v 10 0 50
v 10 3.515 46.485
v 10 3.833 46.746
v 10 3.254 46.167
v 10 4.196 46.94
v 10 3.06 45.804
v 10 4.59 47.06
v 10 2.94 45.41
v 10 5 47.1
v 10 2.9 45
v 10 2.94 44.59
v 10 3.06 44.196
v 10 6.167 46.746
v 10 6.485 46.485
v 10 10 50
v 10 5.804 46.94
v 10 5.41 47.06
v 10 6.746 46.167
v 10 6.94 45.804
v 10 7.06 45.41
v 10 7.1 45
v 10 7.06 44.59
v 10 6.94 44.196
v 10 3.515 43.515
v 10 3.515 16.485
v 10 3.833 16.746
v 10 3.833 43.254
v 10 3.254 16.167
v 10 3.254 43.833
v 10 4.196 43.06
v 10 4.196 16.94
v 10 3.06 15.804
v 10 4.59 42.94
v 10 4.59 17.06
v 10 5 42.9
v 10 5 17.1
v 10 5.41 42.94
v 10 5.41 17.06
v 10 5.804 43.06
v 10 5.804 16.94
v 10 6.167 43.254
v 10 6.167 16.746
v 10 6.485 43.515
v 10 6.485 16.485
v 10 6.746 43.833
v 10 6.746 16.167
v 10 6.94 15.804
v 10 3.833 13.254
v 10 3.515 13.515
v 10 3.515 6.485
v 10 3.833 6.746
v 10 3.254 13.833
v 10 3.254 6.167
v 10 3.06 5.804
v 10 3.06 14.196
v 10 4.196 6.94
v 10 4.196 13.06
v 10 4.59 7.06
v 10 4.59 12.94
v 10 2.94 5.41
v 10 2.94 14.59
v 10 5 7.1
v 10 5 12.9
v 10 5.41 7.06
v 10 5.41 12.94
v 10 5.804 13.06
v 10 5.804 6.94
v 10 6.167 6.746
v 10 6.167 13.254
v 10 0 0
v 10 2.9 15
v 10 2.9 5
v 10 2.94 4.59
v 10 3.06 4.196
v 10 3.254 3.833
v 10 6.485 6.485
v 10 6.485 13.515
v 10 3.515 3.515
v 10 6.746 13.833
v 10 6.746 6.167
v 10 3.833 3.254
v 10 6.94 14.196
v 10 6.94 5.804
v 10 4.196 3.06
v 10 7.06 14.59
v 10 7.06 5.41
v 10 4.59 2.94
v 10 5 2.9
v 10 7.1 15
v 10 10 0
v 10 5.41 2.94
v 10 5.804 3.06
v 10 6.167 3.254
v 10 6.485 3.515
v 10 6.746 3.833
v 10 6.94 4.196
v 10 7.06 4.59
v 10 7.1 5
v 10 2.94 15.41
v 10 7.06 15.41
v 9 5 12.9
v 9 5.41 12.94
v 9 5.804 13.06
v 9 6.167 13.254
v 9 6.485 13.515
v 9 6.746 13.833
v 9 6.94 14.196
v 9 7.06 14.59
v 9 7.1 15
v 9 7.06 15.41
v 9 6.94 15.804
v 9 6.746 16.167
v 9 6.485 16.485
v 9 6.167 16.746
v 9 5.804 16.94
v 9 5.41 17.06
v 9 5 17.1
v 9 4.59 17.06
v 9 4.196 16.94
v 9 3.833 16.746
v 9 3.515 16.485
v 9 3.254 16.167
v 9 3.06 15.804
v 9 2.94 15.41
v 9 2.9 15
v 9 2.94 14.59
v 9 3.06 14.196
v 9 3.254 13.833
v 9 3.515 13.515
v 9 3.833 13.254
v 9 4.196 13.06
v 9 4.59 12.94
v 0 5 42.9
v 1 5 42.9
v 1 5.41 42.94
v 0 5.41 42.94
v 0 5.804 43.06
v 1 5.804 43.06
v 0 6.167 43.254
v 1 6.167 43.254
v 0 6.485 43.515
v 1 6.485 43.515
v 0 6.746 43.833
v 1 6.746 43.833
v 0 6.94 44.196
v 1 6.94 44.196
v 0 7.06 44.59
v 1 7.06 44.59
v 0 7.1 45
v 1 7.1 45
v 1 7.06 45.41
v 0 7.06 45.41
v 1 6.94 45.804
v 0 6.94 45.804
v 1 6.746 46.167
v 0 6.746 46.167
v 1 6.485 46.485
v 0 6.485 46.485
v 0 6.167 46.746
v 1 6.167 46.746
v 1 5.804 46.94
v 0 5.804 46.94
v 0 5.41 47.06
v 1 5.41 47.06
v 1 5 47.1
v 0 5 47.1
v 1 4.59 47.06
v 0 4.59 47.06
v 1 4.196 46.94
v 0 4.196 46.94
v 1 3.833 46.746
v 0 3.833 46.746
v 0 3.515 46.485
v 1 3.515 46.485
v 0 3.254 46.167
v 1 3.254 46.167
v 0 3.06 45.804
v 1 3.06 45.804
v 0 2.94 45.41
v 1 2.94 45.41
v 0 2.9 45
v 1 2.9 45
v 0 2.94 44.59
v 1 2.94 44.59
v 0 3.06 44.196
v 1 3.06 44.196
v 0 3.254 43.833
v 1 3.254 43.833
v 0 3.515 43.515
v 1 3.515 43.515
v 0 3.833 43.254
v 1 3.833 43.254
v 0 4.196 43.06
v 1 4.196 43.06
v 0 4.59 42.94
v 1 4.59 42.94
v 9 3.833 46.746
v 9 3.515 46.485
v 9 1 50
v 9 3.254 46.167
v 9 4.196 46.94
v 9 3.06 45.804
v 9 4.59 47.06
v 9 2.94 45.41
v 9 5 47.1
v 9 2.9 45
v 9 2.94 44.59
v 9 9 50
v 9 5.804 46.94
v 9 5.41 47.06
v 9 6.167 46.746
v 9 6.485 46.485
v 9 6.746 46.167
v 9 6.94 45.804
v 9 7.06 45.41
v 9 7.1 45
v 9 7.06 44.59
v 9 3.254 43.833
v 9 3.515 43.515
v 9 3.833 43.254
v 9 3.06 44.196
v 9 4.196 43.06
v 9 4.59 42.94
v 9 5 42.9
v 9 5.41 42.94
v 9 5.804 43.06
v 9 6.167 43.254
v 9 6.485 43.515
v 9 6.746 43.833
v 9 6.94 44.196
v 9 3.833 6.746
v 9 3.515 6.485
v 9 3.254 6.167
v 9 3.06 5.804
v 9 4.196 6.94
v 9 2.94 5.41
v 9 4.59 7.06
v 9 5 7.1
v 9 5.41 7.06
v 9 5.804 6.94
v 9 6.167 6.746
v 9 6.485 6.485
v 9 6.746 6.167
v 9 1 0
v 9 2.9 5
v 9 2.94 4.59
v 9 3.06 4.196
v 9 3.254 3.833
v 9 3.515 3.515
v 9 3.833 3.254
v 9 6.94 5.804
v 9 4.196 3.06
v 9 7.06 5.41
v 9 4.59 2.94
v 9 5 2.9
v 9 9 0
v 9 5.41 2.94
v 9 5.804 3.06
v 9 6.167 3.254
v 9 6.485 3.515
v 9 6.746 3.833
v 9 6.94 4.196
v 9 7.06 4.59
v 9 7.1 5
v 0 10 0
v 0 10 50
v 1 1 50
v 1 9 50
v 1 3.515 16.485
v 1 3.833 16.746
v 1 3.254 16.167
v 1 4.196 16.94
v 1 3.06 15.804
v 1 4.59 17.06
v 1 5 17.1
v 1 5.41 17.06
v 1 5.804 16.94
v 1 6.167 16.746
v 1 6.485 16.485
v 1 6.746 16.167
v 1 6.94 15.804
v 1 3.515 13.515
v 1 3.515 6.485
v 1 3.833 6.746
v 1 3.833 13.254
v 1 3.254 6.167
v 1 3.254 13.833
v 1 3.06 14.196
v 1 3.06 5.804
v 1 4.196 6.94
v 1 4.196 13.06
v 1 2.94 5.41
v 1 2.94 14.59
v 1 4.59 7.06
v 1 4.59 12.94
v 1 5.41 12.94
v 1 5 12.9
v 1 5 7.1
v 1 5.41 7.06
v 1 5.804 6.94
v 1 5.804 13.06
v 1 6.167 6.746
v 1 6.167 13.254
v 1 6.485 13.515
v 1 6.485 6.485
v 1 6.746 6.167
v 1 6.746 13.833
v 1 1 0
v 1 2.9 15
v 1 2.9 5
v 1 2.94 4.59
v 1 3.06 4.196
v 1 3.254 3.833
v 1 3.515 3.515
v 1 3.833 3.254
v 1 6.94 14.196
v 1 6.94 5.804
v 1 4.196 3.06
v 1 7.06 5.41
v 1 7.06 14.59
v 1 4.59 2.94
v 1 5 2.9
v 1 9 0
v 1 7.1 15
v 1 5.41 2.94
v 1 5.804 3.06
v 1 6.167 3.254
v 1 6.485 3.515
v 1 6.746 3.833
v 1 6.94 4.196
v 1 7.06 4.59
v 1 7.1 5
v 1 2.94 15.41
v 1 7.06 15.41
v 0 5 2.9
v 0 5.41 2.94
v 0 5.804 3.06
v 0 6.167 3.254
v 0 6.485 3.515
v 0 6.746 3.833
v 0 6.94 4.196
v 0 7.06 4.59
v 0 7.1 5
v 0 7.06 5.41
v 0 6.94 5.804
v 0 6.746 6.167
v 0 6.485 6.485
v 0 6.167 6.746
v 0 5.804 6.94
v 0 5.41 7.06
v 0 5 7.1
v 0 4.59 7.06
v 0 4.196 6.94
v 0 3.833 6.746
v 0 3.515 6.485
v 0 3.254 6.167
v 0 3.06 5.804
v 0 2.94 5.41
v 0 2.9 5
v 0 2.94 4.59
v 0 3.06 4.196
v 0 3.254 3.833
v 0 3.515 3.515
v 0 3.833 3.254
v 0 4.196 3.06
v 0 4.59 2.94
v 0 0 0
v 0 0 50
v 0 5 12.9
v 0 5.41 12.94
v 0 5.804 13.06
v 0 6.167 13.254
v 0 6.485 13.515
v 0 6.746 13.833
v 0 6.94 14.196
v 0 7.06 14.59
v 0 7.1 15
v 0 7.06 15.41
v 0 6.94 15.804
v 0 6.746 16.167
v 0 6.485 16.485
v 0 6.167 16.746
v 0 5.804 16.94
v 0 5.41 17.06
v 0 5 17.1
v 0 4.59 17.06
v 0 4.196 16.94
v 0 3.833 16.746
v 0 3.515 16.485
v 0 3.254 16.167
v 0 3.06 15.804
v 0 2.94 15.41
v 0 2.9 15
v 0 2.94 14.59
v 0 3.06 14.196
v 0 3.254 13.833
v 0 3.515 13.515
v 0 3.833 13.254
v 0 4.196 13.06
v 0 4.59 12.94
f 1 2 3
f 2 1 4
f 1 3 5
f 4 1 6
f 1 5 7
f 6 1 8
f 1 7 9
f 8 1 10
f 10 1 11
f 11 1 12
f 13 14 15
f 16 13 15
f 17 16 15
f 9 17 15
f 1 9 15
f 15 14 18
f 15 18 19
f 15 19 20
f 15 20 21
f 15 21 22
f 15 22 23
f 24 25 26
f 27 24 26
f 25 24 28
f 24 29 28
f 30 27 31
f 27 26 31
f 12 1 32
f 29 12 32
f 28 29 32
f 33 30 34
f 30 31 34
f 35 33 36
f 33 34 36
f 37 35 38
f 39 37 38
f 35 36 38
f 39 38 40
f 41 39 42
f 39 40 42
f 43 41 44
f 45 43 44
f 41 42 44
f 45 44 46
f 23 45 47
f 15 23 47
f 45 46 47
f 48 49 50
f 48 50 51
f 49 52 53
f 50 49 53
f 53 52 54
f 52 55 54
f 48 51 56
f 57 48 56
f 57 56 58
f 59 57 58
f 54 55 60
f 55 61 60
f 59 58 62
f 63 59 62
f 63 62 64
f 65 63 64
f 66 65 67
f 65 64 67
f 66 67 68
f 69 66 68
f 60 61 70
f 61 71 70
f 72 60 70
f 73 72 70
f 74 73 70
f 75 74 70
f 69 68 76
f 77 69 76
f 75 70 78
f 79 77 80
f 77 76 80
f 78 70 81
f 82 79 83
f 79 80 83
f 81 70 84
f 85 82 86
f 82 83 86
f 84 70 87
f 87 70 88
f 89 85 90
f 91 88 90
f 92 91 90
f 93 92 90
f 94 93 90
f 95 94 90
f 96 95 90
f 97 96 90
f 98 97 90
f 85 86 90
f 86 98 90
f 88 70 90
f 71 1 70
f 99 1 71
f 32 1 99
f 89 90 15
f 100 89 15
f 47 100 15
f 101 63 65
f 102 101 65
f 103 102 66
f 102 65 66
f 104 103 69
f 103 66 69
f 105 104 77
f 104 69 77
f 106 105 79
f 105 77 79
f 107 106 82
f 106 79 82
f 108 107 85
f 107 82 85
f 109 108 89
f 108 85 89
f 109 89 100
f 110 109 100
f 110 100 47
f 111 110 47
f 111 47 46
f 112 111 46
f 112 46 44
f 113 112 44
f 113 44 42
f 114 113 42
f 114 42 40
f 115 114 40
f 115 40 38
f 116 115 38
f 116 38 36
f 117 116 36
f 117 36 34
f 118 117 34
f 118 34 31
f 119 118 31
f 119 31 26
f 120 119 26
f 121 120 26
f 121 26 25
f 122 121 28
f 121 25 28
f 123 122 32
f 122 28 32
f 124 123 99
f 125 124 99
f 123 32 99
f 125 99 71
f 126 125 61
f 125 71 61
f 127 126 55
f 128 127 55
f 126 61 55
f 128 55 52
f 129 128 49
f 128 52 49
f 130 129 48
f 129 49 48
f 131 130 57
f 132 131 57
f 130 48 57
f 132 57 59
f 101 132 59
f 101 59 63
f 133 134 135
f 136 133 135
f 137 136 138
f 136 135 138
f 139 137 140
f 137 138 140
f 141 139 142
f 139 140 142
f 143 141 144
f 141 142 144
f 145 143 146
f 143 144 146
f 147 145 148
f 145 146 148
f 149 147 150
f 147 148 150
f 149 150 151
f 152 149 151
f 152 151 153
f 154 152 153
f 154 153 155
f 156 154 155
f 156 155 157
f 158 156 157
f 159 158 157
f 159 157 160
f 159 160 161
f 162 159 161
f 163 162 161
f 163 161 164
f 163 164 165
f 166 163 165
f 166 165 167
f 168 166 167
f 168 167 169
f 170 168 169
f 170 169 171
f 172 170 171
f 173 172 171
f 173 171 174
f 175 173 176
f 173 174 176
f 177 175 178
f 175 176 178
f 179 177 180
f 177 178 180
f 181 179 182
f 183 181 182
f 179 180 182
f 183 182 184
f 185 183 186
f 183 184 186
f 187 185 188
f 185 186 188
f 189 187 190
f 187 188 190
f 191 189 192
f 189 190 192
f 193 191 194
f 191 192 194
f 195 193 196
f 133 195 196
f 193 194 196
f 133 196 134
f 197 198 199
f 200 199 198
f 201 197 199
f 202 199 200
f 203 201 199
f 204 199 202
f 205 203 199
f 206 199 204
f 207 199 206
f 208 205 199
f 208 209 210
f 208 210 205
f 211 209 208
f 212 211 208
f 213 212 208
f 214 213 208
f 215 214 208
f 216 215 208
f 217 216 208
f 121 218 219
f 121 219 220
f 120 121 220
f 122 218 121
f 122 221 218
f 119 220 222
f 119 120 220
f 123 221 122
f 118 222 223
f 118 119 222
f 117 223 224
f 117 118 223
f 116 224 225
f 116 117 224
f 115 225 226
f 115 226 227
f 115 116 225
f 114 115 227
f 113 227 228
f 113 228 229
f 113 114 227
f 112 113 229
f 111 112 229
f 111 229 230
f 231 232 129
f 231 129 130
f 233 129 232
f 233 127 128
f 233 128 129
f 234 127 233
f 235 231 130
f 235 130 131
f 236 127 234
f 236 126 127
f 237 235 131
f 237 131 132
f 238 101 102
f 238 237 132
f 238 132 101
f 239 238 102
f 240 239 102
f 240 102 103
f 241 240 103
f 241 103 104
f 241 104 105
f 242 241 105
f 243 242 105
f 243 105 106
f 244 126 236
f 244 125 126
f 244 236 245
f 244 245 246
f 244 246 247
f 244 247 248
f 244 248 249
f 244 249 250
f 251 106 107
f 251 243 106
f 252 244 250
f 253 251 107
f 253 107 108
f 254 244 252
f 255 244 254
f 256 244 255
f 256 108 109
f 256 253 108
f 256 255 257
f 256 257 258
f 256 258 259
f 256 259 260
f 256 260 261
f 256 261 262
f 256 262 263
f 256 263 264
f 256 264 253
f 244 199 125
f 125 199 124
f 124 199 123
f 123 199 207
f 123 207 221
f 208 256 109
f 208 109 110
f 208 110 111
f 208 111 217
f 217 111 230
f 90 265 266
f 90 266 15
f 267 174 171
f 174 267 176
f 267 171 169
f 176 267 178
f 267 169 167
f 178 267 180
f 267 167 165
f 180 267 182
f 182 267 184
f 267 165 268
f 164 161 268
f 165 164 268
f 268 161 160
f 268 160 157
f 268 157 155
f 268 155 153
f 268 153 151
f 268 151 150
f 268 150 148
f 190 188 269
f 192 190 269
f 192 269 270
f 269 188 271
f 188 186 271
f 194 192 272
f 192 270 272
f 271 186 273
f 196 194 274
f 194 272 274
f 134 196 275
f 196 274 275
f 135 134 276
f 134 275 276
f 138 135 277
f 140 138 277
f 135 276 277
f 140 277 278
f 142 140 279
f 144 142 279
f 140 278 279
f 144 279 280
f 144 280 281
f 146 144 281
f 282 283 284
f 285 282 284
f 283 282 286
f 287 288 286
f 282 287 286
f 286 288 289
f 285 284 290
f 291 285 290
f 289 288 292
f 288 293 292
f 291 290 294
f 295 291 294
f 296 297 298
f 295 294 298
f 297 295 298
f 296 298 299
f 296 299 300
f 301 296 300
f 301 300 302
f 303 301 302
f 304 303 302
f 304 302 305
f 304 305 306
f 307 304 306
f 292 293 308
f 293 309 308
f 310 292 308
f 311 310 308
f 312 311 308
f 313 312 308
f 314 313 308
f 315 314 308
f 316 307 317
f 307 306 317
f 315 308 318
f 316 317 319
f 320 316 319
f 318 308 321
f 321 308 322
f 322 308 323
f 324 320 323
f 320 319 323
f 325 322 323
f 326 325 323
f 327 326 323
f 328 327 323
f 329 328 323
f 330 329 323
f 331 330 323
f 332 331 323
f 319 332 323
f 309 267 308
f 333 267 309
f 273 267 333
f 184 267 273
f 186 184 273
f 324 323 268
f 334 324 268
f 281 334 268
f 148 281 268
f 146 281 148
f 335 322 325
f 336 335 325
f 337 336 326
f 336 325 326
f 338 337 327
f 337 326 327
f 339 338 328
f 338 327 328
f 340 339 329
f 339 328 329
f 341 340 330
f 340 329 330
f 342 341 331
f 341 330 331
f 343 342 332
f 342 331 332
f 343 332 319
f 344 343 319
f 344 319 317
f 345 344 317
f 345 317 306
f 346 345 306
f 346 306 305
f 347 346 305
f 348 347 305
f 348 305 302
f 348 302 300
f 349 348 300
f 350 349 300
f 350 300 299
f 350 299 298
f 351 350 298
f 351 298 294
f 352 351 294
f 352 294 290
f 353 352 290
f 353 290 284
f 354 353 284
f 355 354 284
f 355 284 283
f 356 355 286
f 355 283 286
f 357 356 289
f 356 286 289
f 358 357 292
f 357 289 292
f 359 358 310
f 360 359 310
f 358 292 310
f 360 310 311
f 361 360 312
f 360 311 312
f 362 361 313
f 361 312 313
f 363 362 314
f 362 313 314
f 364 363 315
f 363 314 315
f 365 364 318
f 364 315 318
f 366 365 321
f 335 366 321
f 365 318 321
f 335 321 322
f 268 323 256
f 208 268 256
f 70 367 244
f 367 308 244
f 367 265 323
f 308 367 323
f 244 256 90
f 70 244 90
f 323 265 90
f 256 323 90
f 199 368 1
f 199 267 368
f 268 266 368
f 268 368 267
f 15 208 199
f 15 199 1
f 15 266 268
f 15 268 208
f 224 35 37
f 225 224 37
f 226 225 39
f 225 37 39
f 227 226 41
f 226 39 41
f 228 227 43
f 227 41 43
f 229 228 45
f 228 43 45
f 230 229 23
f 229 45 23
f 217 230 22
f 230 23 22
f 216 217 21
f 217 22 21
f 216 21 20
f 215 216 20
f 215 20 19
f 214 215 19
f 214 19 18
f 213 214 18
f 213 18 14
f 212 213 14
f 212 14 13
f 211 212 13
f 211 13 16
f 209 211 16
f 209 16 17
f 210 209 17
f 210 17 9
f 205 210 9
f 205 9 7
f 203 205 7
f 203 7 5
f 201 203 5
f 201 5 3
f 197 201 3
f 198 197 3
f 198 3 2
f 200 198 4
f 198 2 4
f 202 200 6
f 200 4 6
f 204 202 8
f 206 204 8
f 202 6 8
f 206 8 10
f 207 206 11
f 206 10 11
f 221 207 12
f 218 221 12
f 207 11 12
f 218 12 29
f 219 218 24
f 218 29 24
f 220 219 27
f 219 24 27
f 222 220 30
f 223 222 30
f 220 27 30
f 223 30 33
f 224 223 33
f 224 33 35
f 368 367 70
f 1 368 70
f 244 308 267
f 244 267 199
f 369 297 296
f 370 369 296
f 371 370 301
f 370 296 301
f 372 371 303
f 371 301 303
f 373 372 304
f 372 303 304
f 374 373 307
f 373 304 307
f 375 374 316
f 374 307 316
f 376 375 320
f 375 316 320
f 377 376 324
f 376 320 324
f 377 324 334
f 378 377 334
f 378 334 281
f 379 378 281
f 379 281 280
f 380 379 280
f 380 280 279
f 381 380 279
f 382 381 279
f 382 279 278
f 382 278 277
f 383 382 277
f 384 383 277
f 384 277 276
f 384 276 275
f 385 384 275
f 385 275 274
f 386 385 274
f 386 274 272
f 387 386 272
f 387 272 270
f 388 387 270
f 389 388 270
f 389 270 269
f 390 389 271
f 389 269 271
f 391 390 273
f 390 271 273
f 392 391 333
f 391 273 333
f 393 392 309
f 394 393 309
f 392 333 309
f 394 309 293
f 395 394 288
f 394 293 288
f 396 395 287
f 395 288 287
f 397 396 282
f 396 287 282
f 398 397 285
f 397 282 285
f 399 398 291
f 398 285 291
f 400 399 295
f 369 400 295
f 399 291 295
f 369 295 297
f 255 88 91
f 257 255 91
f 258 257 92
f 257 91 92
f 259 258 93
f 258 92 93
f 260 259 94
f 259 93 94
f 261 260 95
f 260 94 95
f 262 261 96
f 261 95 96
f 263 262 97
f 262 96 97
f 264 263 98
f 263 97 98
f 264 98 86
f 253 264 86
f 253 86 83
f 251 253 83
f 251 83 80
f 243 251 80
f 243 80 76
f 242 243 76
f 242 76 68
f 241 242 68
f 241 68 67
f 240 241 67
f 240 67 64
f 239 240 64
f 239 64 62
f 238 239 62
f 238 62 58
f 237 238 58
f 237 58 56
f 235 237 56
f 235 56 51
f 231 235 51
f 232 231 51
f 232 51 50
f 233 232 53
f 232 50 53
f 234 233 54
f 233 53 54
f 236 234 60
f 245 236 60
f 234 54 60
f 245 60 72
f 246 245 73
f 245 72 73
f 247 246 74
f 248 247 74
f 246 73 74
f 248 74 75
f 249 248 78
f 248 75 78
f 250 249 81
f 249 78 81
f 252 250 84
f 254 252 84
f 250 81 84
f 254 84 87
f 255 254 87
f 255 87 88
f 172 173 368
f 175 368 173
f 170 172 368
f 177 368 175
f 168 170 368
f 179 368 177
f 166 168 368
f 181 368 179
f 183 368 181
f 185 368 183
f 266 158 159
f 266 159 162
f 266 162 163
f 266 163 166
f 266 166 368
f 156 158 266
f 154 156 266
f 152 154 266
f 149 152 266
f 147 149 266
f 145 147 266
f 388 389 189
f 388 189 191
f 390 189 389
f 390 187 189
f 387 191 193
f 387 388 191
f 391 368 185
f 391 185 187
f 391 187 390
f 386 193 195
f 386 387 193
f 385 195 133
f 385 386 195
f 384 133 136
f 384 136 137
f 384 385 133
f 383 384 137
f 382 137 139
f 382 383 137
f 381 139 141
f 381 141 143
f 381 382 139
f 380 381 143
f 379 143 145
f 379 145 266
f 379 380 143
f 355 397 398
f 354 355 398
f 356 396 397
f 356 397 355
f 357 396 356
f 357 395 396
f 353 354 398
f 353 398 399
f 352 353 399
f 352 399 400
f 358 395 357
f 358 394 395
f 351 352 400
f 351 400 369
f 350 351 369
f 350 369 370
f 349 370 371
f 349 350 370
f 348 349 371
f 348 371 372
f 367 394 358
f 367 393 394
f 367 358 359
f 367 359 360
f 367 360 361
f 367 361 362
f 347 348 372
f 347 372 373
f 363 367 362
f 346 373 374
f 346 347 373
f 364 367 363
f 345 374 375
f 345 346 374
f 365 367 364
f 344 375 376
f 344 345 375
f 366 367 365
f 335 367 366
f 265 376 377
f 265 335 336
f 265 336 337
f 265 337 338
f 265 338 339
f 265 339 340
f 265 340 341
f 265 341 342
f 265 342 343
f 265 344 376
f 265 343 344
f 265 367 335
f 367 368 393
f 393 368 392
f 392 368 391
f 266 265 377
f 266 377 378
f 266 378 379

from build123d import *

# Parameters (mm, degrees)
SKETCH_1_W          = 10
SKETCH_1_H          = 10
SKETCH_1_W_2        = 8
SKETCH_1_H_2        = 8
EXTRUDE_1_DEPTH     = 50
CUT_EXTRUDE_1_REACH = 53.962
SKETCH_2_R          = 2.1


with BuildPart() as part:
    # ｽｹｯﾁ1 → 押し出し-薄板1 (new body)
    with BuildSketch(Plane.XY):
        with Locations((5, 5)):
            Rectangle(SKETCH_1_W, SKETCH_1_H)
        with Locations((5, 5)):
            Rectangle(SKETCH_1_W_2, SKETCH_1_H_2, mode=Mode.SUBTRACT)
    extrude(amount=EXTRUDE_1_DEPTH)

    # ｶｯﾄ - 押し出し1: up to this face of the body (flat: up to its plane)
    cut_extrude_1_end = Plane(part.part.faces().sort_by_distance((0, 5, 25))[0])
    # ｽｹｯﾁ2 → ｶｯﾄ - 押し出し1 (cut, up to the picked face)
    with BuildSketch(Plane(origin=(10, 0, 0), x_dir=(0, 0, -1), z_dir=(1, 0, 0)), mode=Mode.PRIVATE) as cut_extrude_1_sk1:
        with Locations((-5, 5)):
            Circle(SKETCH_2_R)
    cut_extrude_1_tool1 = split(extrude(cut_extrude_1_sk1.sketch, amount=-CUT_EXTRUDE_1_REACH, mode=Mode.PRIVATE), bisect_by=cut_extrude_1_end, keep=Keep.BOTH, mode=Mode.PRIVATE)
    # ｽｹｯﾁ2 → ｶｯﾄ - 押し出し1 (cut, up to the picked face)
    with BuildSketch(Plane(origin=(10, 0, 0), x_dir=(0, 0, -1), z_dir=(1, 0, 0)), mode=Mode.PRIVATE) as cut_extrude_1_sk2:
        with Locations((-15, 5)):
            Circle(SKETCH_2_R)
    cut_extrude_1_tool2 = split(extrude(cut_extrude_1_sk2.sketch, amount=-CUT_EXTRUDE_1_REACH, mode=Mode.PRIVATE), bisect_by=cut_extrude_1_end, keep=Keep.BOTH, mode=Mode.PRIVATE)
    # ｽｹｯﾁ2 → ｶｯﾄ - 押し出し1 (cut, up to the picked face)
    with BuildSketch(Plane(origin=(10, 0, 0), x_dir=(0, 0, -1), z_dir=(1, 0, 0)), mode=Mode.PRIVATE) as cut_extrude_1_sk3:
        with Locations((-45, 5)):
            Circle(SKETCH_2_R)
    cut_extrude_1_tool3 = split(extrude(cut_extrude_1_sk3.sketch, amount=-CUT_EXTRUDE_1_REACH, mode=Mode.PRIVATE), bisect_by=cut_extrude_1_end, keep=Keep.BOTH, mode=Mode.PRIVATE)
    add(cut_extrude_1_tool1.solids().sort_by(Axis((10, 5, 5), (-1, 0, 0)))[0], mode=Mode.SUBTRACT)
    add(cut_extrude_1_tool2.solids().sort_by(Axis((10, 5, 15), (-1, 0, 0)))[0], mode=Mode.SUBTRACT)
    add(cut_extrude_1_tool3.solids().sort_by(Axis((10, 5, 45), (-1, 0, 0)))[0], mode=Mode.SUBTRACT)


solid = part.part
